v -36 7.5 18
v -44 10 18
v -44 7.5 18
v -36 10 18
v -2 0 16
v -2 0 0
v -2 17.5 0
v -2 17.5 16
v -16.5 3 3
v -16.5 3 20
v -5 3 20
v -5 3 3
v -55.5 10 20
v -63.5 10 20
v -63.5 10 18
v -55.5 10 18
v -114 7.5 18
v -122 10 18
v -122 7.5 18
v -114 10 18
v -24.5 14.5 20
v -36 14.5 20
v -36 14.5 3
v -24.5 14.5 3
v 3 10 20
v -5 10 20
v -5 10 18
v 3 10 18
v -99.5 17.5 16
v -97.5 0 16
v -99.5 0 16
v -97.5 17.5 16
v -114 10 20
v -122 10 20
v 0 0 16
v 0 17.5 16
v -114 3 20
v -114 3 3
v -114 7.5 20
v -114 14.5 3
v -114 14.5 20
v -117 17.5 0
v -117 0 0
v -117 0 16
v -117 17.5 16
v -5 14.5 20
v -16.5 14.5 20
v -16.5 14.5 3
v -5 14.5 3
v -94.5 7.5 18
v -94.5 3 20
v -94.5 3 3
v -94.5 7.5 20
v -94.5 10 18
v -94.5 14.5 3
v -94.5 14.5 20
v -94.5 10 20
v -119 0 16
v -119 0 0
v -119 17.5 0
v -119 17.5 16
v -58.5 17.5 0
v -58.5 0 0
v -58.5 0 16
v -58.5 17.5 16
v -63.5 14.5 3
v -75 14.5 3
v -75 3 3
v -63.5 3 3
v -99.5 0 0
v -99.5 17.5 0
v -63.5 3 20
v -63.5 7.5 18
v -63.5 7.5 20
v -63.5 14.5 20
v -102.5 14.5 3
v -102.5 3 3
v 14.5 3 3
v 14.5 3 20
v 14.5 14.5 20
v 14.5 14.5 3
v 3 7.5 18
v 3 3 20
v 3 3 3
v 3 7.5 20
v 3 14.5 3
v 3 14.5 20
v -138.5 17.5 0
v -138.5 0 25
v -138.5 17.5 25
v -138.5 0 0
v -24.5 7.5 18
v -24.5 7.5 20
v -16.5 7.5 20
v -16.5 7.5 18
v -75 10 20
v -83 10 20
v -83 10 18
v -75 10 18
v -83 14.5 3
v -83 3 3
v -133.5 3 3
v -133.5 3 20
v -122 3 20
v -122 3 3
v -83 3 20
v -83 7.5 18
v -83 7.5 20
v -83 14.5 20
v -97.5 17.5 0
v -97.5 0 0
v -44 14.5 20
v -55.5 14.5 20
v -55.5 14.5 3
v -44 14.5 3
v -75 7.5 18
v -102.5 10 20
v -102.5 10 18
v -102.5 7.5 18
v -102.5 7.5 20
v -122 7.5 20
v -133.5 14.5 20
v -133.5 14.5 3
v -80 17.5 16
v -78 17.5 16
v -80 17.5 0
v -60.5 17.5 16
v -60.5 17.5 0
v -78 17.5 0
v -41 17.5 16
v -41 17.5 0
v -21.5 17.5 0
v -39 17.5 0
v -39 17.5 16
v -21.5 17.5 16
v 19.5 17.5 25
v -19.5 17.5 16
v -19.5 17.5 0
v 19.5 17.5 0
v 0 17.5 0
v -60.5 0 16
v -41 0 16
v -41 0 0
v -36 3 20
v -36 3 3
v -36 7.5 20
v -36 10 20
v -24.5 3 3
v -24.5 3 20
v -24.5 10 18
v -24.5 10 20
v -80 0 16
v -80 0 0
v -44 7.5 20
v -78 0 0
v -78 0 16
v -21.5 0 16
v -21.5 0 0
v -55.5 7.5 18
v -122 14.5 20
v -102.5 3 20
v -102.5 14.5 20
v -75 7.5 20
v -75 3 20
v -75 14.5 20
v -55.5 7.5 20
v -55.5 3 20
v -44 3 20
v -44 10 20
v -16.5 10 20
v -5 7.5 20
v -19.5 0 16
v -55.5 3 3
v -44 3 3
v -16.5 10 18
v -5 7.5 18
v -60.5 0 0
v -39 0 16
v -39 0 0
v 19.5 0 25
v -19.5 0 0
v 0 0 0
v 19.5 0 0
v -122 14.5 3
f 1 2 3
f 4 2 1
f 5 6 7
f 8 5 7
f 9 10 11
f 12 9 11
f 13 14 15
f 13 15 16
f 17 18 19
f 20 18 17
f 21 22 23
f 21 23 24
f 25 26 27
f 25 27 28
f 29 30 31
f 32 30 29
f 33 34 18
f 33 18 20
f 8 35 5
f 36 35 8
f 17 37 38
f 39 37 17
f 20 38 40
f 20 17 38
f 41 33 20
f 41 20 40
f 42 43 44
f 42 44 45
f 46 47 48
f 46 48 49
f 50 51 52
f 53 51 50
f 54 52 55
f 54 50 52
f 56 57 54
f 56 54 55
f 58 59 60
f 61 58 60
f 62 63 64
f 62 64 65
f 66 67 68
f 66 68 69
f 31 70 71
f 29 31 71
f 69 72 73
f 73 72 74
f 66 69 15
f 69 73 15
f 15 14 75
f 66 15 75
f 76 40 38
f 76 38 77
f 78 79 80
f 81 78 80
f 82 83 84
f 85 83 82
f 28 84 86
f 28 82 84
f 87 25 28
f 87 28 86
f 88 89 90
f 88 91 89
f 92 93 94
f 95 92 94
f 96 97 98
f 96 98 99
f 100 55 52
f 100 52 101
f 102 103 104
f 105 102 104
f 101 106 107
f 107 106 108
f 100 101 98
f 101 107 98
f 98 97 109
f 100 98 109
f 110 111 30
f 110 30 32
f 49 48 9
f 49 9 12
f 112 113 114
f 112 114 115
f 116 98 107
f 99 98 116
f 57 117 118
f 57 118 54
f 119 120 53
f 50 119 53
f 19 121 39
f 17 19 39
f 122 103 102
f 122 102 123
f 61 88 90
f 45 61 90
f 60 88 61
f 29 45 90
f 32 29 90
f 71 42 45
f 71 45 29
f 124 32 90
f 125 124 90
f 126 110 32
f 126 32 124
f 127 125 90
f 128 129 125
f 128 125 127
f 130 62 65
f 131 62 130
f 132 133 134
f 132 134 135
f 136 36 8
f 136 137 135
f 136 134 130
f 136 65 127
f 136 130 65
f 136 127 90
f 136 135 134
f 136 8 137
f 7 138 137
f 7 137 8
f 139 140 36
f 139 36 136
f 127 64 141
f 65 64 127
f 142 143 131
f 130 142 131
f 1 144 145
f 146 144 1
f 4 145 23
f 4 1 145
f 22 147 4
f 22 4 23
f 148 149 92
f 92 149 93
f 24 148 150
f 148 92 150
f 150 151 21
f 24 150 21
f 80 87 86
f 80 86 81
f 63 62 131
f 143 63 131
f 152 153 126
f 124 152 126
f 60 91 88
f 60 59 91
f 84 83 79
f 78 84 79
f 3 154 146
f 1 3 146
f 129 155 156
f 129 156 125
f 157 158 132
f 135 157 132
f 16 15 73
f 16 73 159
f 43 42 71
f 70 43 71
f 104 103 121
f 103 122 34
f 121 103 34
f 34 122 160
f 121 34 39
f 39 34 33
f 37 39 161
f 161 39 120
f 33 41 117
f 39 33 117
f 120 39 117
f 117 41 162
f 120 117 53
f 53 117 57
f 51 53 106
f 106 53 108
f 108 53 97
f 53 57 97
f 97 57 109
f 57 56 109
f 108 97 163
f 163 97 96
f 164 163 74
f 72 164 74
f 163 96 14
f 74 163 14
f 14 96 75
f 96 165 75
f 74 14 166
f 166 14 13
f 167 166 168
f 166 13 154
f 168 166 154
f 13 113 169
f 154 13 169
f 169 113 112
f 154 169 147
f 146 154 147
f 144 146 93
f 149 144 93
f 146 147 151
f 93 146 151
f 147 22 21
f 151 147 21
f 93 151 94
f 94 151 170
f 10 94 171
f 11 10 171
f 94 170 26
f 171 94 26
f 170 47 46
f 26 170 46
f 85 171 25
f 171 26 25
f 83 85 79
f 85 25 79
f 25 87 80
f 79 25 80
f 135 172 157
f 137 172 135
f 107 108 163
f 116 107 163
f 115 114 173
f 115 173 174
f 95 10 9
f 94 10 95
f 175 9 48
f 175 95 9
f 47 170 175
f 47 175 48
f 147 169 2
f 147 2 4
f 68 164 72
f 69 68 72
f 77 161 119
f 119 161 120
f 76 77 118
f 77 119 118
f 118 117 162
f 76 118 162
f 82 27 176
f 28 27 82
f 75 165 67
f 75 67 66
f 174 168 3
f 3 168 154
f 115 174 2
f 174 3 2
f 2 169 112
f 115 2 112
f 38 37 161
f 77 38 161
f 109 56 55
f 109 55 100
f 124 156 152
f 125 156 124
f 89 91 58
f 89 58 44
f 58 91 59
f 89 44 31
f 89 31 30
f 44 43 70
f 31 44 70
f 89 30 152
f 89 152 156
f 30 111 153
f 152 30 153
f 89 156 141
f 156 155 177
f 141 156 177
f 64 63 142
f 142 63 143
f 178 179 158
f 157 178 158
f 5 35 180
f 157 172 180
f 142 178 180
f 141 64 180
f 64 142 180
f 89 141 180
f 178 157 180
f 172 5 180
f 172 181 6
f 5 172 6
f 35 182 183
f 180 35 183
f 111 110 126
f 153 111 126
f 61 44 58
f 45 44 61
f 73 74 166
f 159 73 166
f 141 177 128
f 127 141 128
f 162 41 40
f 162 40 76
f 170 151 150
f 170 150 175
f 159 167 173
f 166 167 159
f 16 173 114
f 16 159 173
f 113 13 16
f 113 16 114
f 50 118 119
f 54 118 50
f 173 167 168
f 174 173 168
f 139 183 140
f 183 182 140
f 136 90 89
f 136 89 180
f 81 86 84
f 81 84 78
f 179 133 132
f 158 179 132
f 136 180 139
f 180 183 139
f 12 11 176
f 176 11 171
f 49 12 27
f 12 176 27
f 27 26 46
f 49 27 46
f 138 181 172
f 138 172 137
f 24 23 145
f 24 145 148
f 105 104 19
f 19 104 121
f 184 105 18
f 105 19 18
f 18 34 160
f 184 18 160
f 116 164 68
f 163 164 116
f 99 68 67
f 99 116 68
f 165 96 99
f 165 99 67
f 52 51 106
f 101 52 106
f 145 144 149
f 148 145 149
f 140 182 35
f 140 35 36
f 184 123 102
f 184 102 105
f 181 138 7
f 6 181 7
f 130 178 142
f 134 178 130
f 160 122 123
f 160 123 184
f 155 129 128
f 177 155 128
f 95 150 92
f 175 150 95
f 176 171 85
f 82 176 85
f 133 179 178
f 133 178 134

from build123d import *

# Parameters (mm, degrees)
SKETCH1_W           = 17.5
SKETCH1_H           = 17.5
BOSS_EXTRUDE1_DEPTH = 20
SKETCH2_W           = 11.5
SKETCH2_H           = 11.5
CUT_EXTRUDE1_DEPTH  = 17
SKETCH4_W           = 4
SKETCH4_H           = 17.5
BOSS_EXTRUDE2_DEPTH = 2
LPATTERN1_COUNT     = 8
LPATTERN1_PITCH     = 19.5
SKETCH5_W           = 16
SKETCH5_H           = 17.5
BOSS_EXTRUDE3_DEPTH = 2
SKETCH6_W           = 20
SKETCH6_H           = 17.5
BOSS_EXTRUDE4_DEPTH = 2
SKETCH7_W           = 125
SKETCH7_H           = 2.5
CUT_EXTRUDE2_DEPTH  = 2
SKETCH8_W           = 156
SKETCH8_H           = 15.5
SKETCH8_W_2         = 152.631082986
SKETCH8_H_2         = 13.5
BOSS_EXTRUDE5_DEPTH = 2
SKETCH9_W           = 156
SKETCH9_H           = 15.5
BOSS_EXTRUDE6_DEPTH = 2
SKETCH10_W          = 158
SKETCH10_H          = 17.5
BOSS_EXTRUDE7_DEPTH = 5


with BuildPart() as part:
    # Sketch1 → Boss-Extrude1 (new body)
    with BuildSketch(Plane.XY):
        with Locations((8.75, 8.75)):
            Rectangle(SKETCH1_W, SKETCH1_H)
    extrude(amount=BOSS_EXTRUDE1_DEPTH)

    # Sketch2 → Cut-Extrude1 (cut)
    with BuildSketch(Plane.XY.offset(20)):
        with Locations((8.75, 8.75)):
            Rectangle(SKETCH2_W, SKETCH2_H)
    extrude(amount=-CUT_EXTRUDE1_DEPTH, mode=Mode.SUBTRACT)

    # Sketch4 → Boss-Extrude2 (add)
    with BuildSketch(Plane.ZY):
        with Locations((18, 8.75)):
            Rectangle(SKETCH4_W, SKETCH4_H)
    extrude(amount=BOSS_EXTRUDE2_DEPTH)


with BuildPart() as lpattern1_1:
    # LPattern1: pattern copy
    add(part.part.moved(Location(Vector(-1, 0, 0) * (1 * LPATTERN1_PITCH))))


with BuildPart() as lpattern1_2:
    # LPattern1: pattern copy
    add(part.part.moved(Location(Vector(-1, 0, 0) * (2 * LPATTERN1_PITCH))))


with BuildPart() as lpattern1_3:
    # LPattern1: pattern copy
    add(part.part.moved(Location(Vector(-1, 0, 0) * (3 * LPATTERN1_PITCH))))


with BuildPart() as lpattern1_4:
    # LPattern1: pattern copy
    add(part.part.moved(Location(Vector(-1, 0, 0) * (4 * LPATTERN1_PITCH))))


with BuildPart() as lpattern1_5:
    # LPattern1: pattern copy
    add(part.part.moved(Location(Vector(-1, 0, 0) * (5 * LPATTERN1_PITCH))))


with BuildPart() as lpattern1_6:
    # LPattern1: pattern copy
    add(part.part.moved(Location(Vector(-1, 0, 0) * (6 * LPATTERN1_PITCH))))


with BuildPart() as lpattern1_7:
    # LPattern1: pattern copy
    add(part.part.moved(Location(Vector(-1, 0, 0) * (7 * LPATTERN1_PITCH))))


with BuildPart() as lpattern1_4_1:
    add(lpattern1_4.part)

    # Combine1: union LPattern1_5, LPattern1_6, LPattern1_7, LPattern1_1, LPattern1_2, part, LPattern1_3
    add(lpattern1_5.part)
    add(lpattern1_6.part)
    add(lpattern1_7.part)
    add(lpattern1_1.part)
    add(lpattern1_2.part)
    add(part.part)
    add(lpattern1_3.part)

    # Sketch5 → Boss-Extrude3 (add)
    with BuildSketch(Plane.ZY.offset(136.5)):
        with Locations((8, 8.75)):
            Rectangle(SKETCH5_W, SKETCH5_H)
    extrude(amount=BOSS_EXTRUDE3_DEPTH)

    # Sketch6 → Boss-Extrude4 (add)
    with BuildSketch(Plane(origin=(17.5, 0, 0), x_dir=(0, 0, -1), z_dir=(1, 0, 0))):
        with Locations((-10, 8.75)):
            Rectangle(SKETCH6_W, SKETCH6_H)
    extrude(amount=BOSS_EXTRUDE4_DEPTH)

    # Sketch7 → Cut-Extrude2 (cut)
    with BuildSketch(Plane.XY.offset(20)):
        with Locations((-59.5, 8.75)):
            Rectangle(SKETCH7_W, SKETCH7_H)
    extrude(amount=-CUT_EXTRUDE2_DEPTH, mode=Mode.SUBTRACT)

    # Sketch8 → Boss-Extrude5 (add)
    with BuildSketch(Plane.XY.offset(20)):
        with Locations((-59.5, 8.75)):
            Rectangle(SKETCH8_W, SKETCH8_H)
        with Locations((-59.5, 8.75)):
            Rectangle(SKETCH8_W_2, SKETCH8_H_2, mode=Mode.SUBTRACT)
    extrude(amount=BOSS_EXTRUDE5_DEPTH)

    # Sketch9 → Boss-Extrude6 (add)
    with BuildSketch(Plane.XY.offset(20)):
        with Locations((-59.5, 8.75)):
            Rectangle(SKETCH9_W, SKETCH9_H)
    extrude(amount=BOSS_EXTRUDE6_DEPTH)

    # Sketch10 → Boss-Extrude7 (add)
    with BuildSketch(Plane.XY.offset(20)):
        with Locations((-59.5, 8.75)):
            Rectangle(SKETCH10_W, SKETCH10_H)
    extrude(amount=BOSS_EXTRUDE7_DEPTH)


solid = lpattern1_4_1.part
